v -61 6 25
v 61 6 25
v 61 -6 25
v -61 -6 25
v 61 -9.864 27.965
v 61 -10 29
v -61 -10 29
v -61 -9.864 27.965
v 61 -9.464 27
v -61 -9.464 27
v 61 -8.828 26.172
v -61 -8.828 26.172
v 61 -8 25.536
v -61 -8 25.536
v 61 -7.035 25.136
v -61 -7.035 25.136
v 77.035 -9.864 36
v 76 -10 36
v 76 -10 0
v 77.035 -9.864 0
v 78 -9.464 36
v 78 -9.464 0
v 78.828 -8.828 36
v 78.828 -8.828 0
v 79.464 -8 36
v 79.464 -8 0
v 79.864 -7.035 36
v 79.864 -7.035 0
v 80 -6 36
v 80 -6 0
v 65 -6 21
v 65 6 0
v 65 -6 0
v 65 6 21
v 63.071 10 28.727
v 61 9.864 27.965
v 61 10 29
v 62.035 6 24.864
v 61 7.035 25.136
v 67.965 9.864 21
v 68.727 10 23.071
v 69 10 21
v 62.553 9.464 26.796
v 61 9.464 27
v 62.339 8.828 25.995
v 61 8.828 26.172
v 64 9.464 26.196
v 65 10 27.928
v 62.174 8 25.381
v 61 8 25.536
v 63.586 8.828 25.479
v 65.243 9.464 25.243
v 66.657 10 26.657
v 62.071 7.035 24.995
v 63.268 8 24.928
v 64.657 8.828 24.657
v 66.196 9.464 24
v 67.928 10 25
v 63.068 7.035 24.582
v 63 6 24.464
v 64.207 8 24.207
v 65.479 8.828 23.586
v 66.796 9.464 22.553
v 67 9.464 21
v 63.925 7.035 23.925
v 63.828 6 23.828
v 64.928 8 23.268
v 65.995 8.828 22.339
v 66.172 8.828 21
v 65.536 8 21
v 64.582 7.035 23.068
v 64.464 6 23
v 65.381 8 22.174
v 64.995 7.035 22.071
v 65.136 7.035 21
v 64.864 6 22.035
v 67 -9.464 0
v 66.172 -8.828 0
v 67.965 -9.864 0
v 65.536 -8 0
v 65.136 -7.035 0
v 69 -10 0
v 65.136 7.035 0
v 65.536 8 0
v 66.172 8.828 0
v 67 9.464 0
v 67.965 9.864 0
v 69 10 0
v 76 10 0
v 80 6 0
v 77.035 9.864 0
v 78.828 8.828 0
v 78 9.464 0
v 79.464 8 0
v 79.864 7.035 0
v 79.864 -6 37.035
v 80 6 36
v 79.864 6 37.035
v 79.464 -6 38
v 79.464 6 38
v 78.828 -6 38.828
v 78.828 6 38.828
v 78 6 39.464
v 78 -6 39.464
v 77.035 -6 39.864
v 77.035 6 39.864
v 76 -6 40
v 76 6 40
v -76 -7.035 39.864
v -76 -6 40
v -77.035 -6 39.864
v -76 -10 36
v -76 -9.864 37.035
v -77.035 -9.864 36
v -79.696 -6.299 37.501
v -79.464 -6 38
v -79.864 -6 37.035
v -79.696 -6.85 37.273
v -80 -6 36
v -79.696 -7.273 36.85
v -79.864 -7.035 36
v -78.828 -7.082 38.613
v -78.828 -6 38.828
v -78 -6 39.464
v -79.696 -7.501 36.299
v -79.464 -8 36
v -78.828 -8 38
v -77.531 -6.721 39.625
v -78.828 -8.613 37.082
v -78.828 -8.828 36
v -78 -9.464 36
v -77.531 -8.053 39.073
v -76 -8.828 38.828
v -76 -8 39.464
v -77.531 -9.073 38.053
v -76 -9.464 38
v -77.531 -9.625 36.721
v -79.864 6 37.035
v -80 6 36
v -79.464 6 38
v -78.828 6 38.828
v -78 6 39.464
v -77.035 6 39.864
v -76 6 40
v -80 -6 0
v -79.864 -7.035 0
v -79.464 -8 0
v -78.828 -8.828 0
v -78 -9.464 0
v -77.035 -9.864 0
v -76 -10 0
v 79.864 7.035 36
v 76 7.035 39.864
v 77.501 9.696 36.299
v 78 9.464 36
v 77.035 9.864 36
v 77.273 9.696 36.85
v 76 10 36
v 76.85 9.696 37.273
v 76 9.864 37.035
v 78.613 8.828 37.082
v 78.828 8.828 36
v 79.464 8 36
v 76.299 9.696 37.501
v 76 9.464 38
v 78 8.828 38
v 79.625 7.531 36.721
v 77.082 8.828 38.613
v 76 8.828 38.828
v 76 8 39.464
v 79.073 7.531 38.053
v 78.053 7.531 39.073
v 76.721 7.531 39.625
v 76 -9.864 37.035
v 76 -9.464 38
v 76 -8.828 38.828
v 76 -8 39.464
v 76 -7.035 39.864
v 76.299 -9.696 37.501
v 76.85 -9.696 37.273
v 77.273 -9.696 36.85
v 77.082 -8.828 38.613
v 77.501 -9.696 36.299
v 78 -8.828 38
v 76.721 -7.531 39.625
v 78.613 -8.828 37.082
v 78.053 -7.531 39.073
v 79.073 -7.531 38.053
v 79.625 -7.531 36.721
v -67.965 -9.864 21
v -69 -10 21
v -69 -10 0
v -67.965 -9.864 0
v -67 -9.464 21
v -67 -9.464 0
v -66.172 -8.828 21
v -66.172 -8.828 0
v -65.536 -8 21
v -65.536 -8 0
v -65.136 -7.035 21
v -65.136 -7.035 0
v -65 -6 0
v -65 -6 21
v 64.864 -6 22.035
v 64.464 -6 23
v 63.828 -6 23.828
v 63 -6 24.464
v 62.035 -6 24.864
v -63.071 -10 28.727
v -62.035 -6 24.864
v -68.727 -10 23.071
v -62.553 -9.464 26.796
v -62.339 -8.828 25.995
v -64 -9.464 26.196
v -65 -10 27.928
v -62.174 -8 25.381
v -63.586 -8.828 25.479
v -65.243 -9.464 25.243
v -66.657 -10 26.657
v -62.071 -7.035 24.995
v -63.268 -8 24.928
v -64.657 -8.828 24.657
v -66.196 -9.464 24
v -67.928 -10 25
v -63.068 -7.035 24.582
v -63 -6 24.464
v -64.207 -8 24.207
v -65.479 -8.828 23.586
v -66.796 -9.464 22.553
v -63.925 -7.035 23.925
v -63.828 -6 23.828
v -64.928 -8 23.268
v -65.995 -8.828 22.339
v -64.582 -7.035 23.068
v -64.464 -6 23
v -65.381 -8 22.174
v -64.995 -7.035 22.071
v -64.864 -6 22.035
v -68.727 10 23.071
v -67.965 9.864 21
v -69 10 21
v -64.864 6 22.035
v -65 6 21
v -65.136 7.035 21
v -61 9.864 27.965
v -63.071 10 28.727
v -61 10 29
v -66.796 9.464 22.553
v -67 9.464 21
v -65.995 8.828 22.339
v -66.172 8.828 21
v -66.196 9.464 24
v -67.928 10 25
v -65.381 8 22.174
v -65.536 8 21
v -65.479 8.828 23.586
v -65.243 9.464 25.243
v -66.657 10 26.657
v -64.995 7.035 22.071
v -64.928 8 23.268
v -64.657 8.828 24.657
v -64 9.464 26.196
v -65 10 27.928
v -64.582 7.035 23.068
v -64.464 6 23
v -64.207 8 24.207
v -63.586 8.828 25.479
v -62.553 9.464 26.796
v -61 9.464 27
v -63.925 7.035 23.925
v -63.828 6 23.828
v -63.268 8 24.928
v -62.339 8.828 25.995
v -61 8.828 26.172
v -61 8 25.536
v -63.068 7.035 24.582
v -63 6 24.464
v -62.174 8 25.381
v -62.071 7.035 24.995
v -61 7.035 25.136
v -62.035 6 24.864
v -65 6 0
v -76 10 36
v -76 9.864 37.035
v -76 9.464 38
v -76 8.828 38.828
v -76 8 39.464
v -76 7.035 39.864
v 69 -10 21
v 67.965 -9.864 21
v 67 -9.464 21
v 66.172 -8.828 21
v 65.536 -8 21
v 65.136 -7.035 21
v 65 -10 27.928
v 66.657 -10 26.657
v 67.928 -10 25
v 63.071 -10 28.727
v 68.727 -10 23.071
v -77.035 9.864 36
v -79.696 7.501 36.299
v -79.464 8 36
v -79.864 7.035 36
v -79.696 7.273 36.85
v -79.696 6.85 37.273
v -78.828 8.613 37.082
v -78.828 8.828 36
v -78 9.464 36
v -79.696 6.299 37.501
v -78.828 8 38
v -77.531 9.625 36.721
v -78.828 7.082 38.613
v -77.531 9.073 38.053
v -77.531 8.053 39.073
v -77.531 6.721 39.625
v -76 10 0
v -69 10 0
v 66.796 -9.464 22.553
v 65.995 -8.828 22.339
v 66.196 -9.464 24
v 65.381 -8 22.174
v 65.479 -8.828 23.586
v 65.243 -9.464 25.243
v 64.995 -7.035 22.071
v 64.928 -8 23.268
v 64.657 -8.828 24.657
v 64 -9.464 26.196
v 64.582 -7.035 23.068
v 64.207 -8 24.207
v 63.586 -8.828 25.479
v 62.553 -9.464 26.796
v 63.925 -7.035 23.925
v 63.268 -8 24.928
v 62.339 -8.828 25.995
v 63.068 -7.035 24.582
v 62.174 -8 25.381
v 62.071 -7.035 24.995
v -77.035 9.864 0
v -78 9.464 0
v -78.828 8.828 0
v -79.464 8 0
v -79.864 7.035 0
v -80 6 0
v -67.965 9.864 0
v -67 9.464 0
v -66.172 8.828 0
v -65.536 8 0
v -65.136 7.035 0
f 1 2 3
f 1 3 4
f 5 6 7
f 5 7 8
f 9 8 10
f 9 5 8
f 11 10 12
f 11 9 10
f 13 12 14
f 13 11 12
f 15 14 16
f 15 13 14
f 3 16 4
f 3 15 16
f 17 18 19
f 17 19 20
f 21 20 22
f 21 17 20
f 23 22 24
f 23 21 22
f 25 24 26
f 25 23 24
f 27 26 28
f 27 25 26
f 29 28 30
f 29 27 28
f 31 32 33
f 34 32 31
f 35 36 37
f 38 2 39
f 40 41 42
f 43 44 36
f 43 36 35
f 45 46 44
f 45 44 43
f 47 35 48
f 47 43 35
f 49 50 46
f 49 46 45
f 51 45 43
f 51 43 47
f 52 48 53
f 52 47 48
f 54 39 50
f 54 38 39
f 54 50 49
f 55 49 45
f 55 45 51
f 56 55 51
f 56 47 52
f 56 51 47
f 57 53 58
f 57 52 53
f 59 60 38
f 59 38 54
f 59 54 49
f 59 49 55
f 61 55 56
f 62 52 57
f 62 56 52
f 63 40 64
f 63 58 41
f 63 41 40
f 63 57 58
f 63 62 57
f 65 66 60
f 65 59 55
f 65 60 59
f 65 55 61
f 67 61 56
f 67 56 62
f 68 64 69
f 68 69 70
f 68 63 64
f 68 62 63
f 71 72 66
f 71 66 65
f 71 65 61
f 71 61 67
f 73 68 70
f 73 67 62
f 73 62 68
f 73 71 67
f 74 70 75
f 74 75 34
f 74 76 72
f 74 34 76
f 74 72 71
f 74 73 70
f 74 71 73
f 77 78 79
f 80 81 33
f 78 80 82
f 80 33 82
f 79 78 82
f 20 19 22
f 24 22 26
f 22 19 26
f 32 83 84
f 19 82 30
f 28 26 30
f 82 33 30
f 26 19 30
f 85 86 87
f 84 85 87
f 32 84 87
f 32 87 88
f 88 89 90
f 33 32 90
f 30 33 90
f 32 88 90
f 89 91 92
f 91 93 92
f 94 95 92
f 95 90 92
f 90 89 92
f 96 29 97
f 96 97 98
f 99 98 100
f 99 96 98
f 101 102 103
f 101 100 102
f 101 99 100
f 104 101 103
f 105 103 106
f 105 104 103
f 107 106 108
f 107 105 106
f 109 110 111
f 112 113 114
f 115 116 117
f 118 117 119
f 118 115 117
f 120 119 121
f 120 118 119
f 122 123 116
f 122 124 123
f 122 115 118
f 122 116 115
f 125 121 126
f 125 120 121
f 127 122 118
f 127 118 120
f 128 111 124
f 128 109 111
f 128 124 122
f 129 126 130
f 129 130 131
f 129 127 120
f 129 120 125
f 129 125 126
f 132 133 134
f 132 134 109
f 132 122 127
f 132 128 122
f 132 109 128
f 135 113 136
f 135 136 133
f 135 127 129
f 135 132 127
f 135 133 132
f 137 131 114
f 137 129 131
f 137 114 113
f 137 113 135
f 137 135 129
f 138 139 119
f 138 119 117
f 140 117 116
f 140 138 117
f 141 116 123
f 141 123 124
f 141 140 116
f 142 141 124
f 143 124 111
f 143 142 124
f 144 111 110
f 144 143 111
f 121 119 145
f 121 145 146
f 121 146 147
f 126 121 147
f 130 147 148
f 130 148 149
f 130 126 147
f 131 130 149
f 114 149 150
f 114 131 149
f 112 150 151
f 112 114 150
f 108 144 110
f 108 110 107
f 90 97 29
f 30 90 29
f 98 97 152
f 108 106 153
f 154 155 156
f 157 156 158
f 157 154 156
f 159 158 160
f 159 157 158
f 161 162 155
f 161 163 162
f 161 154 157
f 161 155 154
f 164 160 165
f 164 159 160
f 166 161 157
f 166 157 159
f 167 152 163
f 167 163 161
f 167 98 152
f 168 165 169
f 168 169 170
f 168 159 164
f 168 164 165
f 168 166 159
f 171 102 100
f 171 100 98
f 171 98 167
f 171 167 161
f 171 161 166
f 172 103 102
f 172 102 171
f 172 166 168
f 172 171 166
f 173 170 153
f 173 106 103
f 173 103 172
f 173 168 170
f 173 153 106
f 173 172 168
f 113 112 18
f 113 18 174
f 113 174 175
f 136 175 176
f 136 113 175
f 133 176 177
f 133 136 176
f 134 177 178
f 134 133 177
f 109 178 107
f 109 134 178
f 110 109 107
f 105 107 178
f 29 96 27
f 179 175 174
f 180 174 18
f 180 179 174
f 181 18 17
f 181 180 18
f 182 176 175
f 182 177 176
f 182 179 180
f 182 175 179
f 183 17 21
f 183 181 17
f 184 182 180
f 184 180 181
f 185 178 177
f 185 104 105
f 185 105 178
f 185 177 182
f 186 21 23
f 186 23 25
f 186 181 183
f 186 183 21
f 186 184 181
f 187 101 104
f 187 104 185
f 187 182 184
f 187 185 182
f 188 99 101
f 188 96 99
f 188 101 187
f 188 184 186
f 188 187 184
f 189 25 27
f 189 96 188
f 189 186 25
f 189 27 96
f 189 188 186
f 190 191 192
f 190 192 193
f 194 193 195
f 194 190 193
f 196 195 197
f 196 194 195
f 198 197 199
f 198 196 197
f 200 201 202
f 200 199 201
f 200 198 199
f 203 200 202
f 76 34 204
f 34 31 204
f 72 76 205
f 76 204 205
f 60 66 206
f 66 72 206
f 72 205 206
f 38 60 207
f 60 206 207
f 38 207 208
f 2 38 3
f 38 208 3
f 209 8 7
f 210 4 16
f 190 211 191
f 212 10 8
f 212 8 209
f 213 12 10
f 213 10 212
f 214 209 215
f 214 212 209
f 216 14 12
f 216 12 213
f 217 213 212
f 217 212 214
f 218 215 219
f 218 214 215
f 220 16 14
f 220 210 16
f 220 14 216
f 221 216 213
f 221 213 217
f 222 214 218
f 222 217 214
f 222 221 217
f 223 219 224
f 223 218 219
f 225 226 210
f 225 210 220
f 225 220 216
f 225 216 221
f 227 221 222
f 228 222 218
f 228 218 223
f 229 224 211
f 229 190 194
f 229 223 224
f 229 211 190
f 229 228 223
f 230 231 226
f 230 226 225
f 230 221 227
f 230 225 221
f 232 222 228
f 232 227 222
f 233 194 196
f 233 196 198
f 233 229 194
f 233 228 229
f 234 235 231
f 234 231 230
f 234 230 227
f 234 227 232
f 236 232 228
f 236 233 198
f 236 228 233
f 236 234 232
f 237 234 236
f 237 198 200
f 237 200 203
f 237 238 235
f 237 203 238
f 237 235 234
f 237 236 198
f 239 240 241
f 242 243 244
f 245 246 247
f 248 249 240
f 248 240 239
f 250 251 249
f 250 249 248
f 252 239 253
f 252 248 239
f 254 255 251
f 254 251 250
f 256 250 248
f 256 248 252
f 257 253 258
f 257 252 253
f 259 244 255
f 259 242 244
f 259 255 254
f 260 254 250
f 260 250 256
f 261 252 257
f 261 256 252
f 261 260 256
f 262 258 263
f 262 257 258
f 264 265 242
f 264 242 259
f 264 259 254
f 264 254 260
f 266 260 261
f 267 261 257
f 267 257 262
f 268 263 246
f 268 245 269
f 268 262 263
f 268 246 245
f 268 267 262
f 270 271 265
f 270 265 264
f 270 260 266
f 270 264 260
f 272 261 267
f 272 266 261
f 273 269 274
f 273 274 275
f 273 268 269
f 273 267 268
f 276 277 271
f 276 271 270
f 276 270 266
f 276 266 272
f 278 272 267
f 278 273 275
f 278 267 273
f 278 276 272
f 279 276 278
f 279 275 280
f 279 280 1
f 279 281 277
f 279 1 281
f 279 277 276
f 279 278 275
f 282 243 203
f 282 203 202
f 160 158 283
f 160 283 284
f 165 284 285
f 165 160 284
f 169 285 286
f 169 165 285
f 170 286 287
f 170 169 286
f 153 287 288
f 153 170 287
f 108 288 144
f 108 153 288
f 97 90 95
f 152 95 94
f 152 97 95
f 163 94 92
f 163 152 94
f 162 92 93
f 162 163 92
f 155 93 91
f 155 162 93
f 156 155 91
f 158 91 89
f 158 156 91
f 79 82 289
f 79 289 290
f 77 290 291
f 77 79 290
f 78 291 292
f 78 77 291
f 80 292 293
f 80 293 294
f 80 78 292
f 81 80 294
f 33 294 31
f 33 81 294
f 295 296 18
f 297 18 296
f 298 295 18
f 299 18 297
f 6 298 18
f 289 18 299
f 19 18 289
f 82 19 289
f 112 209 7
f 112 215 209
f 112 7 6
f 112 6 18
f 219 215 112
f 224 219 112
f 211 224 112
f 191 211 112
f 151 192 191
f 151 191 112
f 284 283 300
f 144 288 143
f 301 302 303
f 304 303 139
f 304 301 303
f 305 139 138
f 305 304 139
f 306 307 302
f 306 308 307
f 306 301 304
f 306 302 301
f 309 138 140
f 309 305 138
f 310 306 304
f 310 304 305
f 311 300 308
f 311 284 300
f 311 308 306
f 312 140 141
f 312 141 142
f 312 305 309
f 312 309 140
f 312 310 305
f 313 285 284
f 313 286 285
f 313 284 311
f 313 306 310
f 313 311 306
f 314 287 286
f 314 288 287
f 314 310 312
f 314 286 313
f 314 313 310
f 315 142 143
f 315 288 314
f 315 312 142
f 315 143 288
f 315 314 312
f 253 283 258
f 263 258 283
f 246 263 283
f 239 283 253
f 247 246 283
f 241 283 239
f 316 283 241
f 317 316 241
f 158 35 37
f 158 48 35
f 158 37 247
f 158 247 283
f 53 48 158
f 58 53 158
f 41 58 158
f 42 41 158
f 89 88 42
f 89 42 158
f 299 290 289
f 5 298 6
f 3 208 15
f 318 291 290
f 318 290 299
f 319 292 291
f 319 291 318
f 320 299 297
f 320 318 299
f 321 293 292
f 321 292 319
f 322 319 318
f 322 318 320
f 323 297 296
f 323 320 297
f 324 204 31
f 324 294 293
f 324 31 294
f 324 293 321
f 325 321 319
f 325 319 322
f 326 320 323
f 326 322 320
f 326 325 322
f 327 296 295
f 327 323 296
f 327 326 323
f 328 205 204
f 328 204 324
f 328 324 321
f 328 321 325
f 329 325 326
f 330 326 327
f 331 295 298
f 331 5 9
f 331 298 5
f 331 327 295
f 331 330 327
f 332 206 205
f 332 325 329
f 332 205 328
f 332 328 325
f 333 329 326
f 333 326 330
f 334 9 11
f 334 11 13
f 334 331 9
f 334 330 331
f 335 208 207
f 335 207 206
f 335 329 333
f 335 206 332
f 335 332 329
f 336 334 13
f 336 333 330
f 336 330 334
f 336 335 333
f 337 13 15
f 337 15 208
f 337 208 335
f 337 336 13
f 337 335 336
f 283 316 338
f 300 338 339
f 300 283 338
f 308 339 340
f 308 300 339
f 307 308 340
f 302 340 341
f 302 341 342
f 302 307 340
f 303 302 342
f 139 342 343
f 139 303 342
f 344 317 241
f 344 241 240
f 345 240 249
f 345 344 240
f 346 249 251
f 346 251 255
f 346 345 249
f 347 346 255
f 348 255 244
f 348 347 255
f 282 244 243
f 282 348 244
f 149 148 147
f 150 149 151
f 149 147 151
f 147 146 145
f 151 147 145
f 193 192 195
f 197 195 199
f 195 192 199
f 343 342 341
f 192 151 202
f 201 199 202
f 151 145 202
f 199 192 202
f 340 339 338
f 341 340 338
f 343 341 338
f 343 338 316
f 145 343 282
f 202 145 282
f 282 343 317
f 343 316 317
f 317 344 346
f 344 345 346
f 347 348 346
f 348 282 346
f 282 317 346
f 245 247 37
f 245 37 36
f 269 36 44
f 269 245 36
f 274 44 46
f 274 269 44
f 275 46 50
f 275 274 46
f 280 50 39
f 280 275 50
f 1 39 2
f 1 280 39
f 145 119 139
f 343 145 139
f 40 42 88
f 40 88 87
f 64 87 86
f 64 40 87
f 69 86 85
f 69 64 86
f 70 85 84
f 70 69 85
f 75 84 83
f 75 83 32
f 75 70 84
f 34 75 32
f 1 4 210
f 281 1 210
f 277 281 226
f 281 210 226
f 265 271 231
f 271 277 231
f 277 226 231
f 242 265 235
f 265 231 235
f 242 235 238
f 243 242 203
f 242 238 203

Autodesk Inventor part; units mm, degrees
ref_plane "YZ Plane" through (0, 0, 0) normal (1, 0, 0) x (0, 1, 0)
ref_plane "XZ Plane" through (0, 0, 0) normal (0, 1, 0) x (-1, 0, 0)
ref_plane "XY Plane" through (0, 0, 0) normal (0, 0, 1) x (1, 0, 0)
sketch "Sketch4" plane through (0, 0, 0) normal (0, 0, 1) x (1, 0, 0)
  line L0 (-80, 10) -> (80, 10)
  line L1 (80, 10) -> (80, -10)
  line L2 (80, -10) -> (-80, -10)
  line L3 (-80, -10) -> (-80, 10)
  line L4 (-80, 10) -> (80, -10) construction
  line L5 (80, 10) -> (-80, -10) construction
  point P0 (0, 0)
  dimension "d33" = 160
  dimension "d34" = 20
extrude "Extrusion1" add sketch "Sketch4" along normal blind 40
sketch "Sketch5" plane through (-80, 10, 0) normal (0, 1, 0) x (1, 0, 0)
  line L0 (0, 0) -> (160, 0) projected
  line L1 (15, 0) -> (145, 0)
  line L2 (145, 0) -> (145, -25)
  line L3 (145, -25) -> (15, -25)
  line L4 (15, -25) -> (15, 0)
  line L5 (160, -40) -> (0, -40) projected
  line L6 (160, 0) -> (160, -40) projected
  line L7 (0, 0) -> (0, -40) projected
  point P0 (80, 0)
  point P1 (0, -20)
  dimension "d37" = 15
  dimension "d38" = 15
  dimension "d39" = 15
extrude "Extrusion2" cut sketch "Sketch5" against normal blind 40 contours L0 L2 L3 L4
fillet "Fillet1" radius 4 16 edges at (80, 0, 40) (0, 10, 40) (0, -10, 40) (80, 10, 20) (80, -10, 20) (0, 10, 25) (65, 10, 12.5) (0, -10, 25) (65, -10, 12.5) (65, 0, 25) (-65, -10, 12.5) (-65, 0, 25) (-65, 10, 12.5) (-80, -10, 20) (-80, 10, 20) (-80, 0, 40)
properties part number "Handle"
